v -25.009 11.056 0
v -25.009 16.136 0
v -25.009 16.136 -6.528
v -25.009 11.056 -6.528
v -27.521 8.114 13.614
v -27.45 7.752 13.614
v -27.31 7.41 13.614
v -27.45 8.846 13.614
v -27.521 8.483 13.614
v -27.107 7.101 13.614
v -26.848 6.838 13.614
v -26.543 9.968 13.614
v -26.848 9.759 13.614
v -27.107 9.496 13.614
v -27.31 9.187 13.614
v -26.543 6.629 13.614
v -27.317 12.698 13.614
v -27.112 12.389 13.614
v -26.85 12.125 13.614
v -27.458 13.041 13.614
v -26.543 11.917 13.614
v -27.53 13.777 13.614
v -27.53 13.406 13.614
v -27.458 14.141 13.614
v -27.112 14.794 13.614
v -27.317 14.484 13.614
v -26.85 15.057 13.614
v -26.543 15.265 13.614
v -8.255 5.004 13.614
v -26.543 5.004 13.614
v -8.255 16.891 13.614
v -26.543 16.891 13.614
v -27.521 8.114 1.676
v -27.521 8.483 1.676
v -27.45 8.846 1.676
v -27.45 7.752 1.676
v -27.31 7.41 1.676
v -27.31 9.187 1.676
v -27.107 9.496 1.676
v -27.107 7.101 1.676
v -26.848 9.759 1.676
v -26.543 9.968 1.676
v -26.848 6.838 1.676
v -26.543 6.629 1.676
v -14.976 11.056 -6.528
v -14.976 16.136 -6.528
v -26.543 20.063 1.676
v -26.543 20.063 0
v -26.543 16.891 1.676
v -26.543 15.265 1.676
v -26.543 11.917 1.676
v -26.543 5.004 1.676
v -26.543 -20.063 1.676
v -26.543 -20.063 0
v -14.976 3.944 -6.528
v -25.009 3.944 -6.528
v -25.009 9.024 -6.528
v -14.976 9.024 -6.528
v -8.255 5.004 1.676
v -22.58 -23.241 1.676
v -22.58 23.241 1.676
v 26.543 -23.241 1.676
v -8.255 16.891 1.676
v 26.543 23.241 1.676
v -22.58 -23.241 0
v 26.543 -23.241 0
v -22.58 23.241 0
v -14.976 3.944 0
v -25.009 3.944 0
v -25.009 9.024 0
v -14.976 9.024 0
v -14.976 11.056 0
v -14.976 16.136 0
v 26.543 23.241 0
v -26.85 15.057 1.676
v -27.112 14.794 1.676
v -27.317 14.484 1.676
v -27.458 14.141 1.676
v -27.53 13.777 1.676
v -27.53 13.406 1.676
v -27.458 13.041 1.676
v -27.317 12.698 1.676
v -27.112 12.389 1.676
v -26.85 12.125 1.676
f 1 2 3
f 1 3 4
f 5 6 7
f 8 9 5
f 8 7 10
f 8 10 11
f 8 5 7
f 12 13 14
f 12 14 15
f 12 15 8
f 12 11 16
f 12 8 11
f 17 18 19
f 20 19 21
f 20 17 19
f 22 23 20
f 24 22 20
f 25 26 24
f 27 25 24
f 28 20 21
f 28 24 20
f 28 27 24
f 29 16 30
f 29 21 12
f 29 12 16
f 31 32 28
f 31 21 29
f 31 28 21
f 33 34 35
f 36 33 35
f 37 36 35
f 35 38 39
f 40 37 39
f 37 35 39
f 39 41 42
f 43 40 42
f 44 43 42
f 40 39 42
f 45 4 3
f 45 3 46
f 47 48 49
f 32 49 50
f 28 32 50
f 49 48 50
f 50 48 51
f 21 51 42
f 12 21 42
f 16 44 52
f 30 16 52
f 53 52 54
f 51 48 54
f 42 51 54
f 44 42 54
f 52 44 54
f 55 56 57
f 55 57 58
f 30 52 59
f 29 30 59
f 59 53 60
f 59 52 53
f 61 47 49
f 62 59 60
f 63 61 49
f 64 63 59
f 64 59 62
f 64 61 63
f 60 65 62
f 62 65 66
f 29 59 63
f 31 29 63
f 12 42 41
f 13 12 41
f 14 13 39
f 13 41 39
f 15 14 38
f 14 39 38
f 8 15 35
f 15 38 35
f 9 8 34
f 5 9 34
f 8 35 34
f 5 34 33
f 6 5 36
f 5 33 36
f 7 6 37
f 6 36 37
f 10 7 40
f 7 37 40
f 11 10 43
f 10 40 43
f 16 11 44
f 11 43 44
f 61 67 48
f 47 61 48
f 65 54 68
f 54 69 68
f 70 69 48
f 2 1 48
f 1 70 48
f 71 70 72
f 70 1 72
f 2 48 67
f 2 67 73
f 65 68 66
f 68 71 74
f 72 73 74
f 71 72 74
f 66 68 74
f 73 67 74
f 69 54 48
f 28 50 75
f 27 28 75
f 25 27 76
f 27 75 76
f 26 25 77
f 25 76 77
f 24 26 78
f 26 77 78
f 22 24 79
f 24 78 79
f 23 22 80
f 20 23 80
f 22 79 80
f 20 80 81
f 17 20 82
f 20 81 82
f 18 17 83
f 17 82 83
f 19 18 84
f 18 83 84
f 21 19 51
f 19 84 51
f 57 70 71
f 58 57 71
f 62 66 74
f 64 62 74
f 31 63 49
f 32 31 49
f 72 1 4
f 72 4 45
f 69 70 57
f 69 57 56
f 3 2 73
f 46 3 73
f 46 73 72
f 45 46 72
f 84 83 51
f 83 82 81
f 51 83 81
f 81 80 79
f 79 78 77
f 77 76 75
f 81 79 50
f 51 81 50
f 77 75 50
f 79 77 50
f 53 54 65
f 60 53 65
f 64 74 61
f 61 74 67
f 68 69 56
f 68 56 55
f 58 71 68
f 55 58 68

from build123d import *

# Parameters (mm, degrees)
F1_DEPTH = 1.6764
F3_DEPTH = 11.938
F4_W     = 10.033
F4_H     = 5.08
F5_DEPTH = 6.5278


with BuildPart() as f1:
    # F0 (on Top) → F1 (new body)
    with BuildSketch(Plane.XY):
        Polygon((-22.5799904745, -23.241), (26.543, -23.241), (26.543, 23.241), (-22.5799904745, 23.241), (-26.543, 20.062799959), (-26.543, -20.062799959), align=None)
    extrude(amount=F1_DEPTH)

    # F2 (on face) → F3 (join)
    with BuildSketch(Plane.XY.offset(1.6764)):
        with BuildLine():
            Line((-26.543, 6.6294), (-26.543, 5.0038))
            Line((-26.543, 5.0038), (-8.255, 5.0038))
            Line((-8.255, 5.0038), (-8.255, 16.891))
            Line((-8.255, 16.891), (-26.543, 16.891))
            Line((-26.543, 16.891), (-26.543, 15.2654))
            ThreePointArc((-26.543, 15.2654), (-27.5392260553, 13.5911375004), (-26.543, 11.9168750008))
            Line((-26.543, 11.9168750008), (-26.543, 9.967618097))
            ThreePointArc((-26.543, 9.967618097), (-27.5297952384, 8.2985090485), (-26.543, 6.6294))
        make_face()
    extrude(amount=F3_DEPTH)

    # F4 (on face) → F5 (join)
    with BuildSketch(Plane(origin=(0, 0, 0), x_dir=(1, 0, 0), z_dir=(0, 0, -1))):
        with Locations((-19.9928638897, -13.5961750215)):
            Rectangle(F4_W, F4_H)
        with Locations((-19.9928638897, -6.4841750215)):
            Rectangle(F4_W, F4_H)
    extrude(amount=F5_DEPTH)


solid = f1.part
